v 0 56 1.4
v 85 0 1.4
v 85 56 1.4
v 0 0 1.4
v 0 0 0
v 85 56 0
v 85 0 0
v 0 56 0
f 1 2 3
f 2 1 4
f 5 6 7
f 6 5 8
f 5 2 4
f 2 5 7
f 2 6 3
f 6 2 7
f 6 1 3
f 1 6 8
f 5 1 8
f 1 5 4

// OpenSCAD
$fn = 64;

board_x = 85.0;
board_y = 56.0;
board_z = 1.4;

cube([board_x, board_y, board_z], center=false);
